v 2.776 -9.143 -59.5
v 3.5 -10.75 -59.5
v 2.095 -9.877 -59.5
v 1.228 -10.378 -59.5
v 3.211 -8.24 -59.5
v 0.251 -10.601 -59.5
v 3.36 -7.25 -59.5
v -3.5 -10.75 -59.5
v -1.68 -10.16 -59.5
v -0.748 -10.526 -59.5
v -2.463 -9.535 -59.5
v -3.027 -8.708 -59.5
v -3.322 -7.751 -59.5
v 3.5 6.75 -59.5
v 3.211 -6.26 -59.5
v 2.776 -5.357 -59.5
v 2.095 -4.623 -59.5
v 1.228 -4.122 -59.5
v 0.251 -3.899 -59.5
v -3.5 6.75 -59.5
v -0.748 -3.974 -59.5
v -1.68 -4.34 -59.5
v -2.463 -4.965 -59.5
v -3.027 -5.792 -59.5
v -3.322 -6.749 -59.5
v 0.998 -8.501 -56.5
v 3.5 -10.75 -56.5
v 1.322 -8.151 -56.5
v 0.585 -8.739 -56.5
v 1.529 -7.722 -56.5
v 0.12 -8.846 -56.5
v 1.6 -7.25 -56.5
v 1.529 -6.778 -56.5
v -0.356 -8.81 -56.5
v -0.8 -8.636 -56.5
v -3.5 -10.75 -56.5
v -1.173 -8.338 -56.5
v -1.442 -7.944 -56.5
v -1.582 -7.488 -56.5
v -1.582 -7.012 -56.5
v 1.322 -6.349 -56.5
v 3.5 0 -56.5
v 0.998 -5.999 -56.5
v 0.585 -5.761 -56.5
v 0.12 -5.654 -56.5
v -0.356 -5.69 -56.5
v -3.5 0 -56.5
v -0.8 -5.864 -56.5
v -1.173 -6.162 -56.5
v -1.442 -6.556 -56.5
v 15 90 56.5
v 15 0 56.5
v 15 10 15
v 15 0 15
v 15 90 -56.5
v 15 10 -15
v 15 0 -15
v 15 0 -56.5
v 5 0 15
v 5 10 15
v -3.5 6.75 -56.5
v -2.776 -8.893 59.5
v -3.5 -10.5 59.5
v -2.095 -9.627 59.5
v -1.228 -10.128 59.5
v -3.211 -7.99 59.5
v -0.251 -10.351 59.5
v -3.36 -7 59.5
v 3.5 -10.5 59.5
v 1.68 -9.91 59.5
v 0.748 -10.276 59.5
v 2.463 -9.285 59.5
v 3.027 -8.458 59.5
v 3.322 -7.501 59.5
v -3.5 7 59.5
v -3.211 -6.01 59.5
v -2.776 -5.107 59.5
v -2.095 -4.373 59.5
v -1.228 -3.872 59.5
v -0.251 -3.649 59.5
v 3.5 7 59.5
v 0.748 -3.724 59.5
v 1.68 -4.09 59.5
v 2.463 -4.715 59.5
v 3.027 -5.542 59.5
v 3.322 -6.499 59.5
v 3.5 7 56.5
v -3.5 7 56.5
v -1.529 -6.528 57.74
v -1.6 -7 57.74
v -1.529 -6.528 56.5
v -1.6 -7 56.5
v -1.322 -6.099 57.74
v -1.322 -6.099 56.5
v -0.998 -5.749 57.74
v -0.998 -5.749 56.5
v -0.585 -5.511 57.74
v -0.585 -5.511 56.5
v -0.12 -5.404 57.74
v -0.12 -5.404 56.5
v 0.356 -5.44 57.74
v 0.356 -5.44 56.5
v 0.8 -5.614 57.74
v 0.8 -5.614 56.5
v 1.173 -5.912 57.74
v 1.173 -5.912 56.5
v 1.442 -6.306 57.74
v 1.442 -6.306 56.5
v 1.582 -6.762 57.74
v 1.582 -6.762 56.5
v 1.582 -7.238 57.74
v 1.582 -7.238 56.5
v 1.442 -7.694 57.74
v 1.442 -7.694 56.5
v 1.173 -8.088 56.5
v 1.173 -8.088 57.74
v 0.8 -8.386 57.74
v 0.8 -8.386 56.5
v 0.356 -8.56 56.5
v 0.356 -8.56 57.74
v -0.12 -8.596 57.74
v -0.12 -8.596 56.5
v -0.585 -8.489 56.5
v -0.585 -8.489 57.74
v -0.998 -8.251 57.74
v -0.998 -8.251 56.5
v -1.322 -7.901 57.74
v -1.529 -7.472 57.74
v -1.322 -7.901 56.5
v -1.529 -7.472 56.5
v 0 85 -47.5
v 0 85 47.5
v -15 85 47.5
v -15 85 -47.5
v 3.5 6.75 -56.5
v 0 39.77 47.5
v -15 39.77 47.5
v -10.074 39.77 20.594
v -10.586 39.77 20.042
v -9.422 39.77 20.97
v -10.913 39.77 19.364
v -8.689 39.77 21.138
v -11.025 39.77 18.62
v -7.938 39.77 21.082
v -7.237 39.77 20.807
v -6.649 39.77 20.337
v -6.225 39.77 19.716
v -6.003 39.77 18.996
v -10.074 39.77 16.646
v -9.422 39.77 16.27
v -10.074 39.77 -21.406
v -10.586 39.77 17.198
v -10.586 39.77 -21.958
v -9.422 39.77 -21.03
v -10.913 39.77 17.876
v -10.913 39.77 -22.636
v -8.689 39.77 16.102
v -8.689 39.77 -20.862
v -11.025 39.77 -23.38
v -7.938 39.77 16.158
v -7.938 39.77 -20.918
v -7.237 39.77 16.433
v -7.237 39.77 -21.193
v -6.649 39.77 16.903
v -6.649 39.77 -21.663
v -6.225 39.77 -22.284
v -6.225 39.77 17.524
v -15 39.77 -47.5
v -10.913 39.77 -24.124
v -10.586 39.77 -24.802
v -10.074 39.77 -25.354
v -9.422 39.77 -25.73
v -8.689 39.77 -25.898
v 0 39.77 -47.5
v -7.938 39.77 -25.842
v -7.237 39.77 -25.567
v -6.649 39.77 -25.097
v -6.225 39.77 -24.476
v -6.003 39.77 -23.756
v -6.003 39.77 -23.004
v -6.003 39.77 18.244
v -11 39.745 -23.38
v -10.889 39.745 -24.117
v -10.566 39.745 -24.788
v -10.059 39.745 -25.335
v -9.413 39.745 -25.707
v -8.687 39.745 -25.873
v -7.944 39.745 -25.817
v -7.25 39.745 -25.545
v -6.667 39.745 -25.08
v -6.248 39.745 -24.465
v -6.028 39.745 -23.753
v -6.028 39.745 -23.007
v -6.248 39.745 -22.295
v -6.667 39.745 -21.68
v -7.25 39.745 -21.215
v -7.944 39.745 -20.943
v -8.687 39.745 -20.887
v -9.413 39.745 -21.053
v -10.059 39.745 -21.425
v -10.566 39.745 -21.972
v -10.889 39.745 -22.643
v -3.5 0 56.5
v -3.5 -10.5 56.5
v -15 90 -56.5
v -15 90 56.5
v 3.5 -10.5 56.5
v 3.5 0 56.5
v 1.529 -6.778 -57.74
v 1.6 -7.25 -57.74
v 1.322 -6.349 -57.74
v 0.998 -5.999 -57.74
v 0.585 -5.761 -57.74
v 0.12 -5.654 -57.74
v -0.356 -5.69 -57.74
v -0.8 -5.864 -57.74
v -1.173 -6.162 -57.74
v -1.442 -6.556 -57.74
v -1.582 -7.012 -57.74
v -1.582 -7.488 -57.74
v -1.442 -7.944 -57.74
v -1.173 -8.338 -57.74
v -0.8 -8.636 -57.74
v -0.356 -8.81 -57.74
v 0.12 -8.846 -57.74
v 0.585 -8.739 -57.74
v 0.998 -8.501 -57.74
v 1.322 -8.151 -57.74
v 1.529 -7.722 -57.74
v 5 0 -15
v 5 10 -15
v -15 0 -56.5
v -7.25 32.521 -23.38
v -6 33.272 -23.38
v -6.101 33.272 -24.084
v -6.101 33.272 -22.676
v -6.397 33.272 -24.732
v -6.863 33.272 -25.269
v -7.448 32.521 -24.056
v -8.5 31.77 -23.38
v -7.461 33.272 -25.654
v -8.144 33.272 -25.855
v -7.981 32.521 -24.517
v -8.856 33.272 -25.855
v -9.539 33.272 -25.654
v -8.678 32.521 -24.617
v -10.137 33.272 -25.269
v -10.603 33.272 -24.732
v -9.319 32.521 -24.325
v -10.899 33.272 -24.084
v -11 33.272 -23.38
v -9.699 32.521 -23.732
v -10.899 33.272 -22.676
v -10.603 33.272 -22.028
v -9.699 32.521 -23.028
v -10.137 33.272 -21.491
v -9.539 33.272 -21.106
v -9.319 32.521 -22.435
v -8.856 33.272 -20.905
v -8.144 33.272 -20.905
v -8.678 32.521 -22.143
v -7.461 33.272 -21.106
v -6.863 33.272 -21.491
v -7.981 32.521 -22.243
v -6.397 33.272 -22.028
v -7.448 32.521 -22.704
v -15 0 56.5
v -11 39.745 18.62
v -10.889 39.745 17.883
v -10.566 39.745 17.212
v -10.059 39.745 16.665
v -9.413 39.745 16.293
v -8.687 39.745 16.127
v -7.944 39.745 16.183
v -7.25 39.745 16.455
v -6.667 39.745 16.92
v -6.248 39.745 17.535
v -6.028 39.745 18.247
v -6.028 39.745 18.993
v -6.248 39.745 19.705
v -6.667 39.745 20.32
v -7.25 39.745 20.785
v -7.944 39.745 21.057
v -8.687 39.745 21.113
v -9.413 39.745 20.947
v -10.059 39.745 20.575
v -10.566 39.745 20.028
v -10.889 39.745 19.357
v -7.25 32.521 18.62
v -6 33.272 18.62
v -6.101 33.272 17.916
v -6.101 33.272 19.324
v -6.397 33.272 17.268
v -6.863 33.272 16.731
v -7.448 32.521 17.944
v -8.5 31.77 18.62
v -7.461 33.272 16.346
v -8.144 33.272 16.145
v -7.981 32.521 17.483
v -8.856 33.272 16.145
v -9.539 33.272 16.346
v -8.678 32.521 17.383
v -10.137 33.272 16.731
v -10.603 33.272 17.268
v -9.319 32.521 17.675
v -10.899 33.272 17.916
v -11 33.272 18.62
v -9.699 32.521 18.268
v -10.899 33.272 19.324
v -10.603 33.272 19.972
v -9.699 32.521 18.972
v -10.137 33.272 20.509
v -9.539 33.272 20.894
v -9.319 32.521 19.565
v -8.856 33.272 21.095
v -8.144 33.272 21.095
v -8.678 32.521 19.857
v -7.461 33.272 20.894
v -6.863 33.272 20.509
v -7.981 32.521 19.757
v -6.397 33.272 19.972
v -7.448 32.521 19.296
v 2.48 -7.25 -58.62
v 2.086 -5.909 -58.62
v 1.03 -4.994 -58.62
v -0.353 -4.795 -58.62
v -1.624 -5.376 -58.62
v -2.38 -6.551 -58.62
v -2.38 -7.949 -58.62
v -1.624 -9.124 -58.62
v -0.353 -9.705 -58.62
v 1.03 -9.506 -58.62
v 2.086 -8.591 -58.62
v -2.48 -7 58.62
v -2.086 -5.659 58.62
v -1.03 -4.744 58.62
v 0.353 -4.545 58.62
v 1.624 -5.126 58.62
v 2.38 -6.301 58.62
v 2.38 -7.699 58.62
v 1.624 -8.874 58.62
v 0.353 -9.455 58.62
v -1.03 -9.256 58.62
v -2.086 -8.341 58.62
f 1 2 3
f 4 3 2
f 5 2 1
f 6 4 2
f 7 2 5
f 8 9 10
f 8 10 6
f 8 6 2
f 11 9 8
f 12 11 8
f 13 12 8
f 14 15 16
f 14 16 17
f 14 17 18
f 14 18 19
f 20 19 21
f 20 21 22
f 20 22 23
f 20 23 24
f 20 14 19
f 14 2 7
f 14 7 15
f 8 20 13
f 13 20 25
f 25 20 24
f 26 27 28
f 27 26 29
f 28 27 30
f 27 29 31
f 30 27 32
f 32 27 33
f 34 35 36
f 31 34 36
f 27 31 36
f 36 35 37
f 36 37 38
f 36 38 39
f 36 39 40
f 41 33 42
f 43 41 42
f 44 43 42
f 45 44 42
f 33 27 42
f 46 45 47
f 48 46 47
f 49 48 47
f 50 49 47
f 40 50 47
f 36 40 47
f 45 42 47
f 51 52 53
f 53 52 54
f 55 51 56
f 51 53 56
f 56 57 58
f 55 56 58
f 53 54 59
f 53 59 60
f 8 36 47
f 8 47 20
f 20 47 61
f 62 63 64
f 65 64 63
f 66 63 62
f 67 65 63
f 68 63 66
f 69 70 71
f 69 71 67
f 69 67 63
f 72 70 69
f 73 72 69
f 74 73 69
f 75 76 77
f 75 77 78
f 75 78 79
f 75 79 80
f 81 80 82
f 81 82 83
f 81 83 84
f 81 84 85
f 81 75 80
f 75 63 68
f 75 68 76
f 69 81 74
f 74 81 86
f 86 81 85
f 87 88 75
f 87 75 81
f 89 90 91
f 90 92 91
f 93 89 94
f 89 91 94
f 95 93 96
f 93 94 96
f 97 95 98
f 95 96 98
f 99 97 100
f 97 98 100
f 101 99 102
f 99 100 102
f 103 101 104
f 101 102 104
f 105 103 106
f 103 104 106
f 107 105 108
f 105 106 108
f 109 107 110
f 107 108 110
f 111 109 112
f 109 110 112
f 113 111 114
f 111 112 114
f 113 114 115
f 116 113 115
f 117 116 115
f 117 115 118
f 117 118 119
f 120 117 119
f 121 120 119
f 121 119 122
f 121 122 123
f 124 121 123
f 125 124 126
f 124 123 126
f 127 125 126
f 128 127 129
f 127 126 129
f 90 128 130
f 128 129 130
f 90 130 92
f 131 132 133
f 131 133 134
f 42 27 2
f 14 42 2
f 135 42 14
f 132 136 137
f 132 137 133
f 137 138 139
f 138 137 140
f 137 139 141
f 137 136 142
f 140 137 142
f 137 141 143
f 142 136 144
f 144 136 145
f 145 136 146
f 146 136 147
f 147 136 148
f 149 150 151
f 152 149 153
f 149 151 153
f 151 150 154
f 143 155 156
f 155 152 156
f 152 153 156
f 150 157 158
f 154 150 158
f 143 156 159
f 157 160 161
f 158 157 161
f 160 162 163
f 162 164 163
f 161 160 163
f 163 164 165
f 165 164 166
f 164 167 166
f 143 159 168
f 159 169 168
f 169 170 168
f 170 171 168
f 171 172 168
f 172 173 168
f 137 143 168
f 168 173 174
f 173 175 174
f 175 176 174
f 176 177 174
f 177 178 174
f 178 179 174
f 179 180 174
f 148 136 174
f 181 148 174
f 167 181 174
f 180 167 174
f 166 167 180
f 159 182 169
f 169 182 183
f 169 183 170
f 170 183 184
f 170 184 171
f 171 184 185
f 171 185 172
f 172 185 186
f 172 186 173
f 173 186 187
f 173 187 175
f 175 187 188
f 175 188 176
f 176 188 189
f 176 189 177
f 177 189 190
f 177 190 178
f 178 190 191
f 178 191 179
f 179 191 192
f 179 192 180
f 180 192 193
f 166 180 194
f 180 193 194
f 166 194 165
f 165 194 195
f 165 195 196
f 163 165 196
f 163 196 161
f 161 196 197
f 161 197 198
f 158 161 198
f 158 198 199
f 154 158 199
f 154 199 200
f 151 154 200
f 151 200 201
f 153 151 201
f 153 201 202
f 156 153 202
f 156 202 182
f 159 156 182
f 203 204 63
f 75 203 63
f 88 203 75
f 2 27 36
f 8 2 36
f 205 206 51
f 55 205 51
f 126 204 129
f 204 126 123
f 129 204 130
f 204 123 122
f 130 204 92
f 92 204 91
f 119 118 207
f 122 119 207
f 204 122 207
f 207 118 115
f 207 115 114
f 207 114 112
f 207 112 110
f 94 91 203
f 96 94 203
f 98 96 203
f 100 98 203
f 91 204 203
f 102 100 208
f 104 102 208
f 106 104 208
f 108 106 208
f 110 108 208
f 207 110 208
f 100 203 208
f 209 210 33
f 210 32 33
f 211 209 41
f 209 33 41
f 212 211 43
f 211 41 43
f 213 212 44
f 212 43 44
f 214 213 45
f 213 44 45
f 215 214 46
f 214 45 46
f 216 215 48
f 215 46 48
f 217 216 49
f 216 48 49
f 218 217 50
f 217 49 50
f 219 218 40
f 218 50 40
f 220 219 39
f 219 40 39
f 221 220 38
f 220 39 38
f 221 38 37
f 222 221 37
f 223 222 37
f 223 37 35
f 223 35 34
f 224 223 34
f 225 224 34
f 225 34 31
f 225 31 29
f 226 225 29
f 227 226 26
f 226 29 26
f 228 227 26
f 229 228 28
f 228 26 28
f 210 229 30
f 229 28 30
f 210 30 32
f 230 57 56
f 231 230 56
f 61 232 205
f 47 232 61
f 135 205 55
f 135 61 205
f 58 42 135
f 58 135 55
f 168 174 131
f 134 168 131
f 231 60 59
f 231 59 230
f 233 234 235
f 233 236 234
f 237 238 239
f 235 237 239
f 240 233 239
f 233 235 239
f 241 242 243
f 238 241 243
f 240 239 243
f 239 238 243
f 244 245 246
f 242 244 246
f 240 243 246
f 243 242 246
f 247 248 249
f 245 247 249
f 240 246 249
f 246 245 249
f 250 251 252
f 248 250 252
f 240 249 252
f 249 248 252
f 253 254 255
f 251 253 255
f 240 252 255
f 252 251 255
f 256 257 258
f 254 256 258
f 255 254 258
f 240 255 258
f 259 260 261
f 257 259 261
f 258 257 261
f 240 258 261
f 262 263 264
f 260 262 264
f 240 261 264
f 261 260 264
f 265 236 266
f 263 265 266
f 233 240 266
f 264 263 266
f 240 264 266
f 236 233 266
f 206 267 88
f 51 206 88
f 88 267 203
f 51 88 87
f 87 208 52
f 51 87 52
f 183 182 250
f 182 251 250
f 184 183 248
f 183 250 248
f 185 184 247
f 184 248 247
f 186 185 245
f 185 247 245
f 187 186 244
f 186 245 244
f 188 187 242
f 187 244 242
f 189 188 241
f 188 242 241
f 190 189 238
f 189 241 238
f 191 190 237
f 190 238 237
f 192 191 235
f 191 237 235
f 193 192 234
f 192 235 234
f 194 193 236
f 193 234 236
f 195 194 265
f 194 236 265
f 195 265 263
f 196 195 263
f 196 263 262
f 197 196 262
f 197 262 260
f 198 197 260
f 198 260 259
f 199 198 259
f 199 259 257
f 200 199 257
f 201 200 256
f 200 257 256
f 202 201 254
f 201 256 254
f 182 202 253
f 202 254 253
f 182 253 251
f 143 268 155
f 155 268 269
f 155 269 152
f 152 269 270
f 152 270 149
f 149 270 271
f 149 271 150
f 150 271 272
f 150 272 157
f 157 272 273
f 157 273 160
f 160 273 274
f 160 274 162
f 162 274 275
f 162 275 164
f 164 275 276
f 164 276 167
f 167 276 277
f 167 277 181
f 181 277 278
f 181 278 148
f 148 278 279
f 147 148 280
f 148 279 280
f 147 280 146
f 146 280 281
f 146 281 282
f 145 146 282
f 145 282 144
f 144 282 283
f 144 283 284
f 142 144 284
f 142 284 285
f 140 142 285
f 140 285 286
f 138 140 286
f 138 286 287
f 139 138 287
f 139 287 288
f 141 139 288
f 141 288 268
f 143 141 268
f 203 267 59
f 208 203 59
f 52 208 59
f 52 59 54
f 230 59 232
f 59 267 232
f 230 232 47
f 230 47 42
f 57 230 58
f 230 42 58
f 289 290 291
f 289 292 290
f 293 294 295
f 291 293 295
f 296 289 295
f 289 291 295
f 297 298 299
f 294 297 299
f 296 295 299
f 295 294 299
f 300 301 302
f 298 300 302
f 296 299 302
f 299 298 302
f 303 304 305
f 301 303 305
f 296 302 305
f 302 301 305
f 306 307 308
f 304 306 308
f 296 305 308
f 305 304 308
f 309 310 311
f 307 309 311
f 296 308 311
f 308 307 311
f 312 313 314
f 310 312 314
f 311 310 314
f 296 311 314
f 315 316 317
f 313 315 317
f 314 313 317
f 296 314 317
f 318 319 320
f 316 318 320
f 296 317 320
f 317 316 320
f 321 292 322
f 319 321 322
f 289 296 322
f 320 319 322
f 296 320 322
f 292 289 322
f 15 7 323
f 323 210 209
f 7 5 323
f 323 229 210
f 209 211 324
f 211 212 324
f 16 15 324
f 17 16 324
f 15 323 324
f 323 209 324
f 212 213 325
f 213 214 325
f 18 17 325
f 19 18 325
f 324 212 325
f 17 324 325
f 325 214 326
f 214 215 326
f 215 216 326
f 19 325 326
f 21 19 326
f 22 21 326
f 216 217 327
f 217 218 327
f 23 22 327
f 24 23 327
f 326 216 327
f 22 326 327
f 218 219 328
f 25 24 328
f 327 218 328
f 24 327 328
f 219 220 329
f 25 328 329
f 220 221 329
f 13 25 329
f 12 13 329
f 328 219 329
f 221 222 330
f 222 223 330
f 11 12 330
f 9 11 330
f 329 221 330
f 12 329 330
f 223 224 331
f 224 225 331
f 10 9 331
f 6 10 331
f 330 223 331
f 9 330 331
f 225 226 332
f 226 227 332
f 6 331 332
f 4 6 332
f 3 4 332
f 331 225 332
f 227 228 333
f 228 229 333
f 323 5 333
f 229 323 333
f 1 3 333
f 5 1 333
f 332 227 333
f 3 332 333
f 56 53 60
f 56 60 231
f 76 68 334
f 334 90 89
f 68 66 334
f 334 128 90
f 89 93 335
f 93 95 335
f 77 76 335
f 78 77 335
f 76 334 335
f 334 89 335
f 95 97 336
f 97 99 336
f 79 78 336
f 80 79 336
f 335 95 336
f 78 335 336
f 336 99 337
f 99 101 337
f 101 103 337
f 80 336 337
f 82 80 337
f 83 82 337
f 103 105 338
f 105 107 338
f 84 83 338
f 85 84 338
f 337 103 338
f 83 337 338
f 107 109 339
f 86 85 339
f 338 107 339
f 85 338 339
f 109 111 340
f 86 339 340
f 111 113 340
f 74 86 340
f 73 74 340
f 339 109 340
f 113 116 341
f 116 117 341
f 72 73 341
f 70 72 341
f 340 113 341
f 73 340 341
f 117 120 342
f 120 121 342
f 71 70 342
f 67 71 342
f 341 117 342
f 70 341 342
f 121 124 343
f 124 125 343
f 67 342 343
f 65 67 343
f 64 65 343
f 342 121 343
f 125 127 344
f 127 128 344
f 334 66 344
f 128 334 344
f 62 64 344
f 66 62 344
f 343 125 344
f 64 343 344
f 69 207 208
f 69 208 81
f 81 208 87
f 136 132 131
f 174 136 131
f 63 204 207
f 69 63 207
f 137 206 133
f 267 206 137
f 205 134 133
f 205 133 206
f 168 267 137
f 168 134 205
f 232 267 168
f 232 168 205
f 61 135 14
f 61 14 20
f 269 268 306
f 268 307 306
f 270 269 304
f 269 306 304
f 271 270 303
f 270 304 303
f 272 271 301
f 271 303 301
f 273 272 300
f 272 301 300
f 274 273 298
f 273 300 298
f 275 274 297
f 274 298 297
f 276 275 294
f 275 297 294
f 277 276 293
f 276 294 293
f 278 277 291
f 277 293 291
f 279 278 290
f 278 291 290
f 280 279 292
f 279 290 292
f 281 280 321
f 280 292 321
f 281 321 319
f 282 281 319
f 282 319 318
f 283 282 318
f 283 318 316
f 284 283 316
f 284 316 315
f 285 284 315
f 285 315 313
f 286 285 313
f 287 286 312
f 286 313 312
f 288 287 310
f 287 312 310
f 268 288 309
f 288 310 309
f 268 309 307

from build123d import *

# Parameters (mm, degrees)
SKETCH1_W                                            = 30
SKETCH1_H                                            = 113
BOSS_EXTRUDE1_DEPTH                                  = 90
SKETCH3_W                                            = 95
SKETCH3_H                                            = 45.23
CUT_EXTRUDE1_DEPTH                                   = 90
SKETCH4_W                                            = 30
SKETCH4_H                                            = 10
CUT_EXTRUDE2_DEPTH                                   = 10
F_5_0_5_DIAMETER_HOLE1_D                             = 5
F_5_0_5_DIAMETER_HOLE1_DEPTH                         = 6.497848452
F_5_0_5_DIAMETER_HOLE1_CSINK_D                       = 5.05
F_5_0_5_DIAMETER_HOLE1_CSINK_ANGLE                   = 90
F_5_0_5_DIAMETER_HOLE1_TIP                           = 1.502151548
SKETCH9_W                                            = 7
SKETCH9_H                                            = 17.5
BOSS_EXTRUDE2_DEPTH                                  = 3
CSK_FOR_M3_HEX_SOCKET_COUNTERSUNK_CAP_SC_D           = 3.2
CSK_FOR_M3_HEX_SOCKET_COUNTERSUNK_CAP_SC_DEPTH       = 7.23862301
CSK_FOR_M3_HEX_SOCKET_COUNTERSUNK_CAP_SC_CSINK_D     = 6.72
CSK_FOR_M3_HEX_SOCKET_COUNTERSUNK_CAP_SC_CSINK_ANGLE = 90
CSK_FOR_M3_HEX_SOCKET_COUNTERSUNK_CAP_SC_TIP         = 0.96137699
SKETCH14_W                                           = 7
SKETCH14_H                                           = 17.5
BOSS_EXTRUDE3_DEPTH                                  = 3
CSK_FOR_M3_HEX_SOCKET_COUNTERSUNK_CA_2_D             = 3.2
CSK_FOR_M3_HEX_SOCKET_COUNTERSUNK_CA_2_DEPTH         = 7.23862301
CSK_FOR_M3_HEX_SOCKET_COUNTERSUNK_CA_2_CSINK_D       = 6.72
CSK_FOR_M3_HEX_SOCKET_COUNTERSUNK_CA_2_CSINK_ANGLE   = 90
CSK_FOR_M3_HEX_SOCKET_COUNTERSUNK_CA_2_TIP           = 0.96137699


with BuildPart() as part:
    # Sketch1 → Boss-Extrude1 (new body)
    with BuildSketch(Plane(origin=(0, 0, 0), x_dir=(1, 0, 0), z_dir=(0, 1, 0))):
        Rectangle(SKETCH1_W, SKETCH1_H)
    extrude(amount=BOSS_EXTRUDE1_DEPTH)

    # Sketch3 → Cut-Extrude1 (cut)
    with BuildSketch(Plane(origin=(0, 0, 0), x_dir=(0, 0, -1), z_dir=(1, 0, 0))):
        with Locations((0, 62.385)):
            Rectangle(SKETCH3_W, SKETCH3_H)
    extrude(amount=-CUT_EXTRUDE1_DEPTH, mode=Mode.SUBTRACT)

    # Sketch4 → Cut-Extrude2 (cut)
    with BuildSketch(Plane(origin=(15, 0, 0), x_dir=(0, 0, -1), z_dir=(1, 0, 0))):
        with Locations((0, 5)):
            Rectangle(SKETCH4_W, SKETCH4_H)
    extrude(amount=-CUT_EXTRUDE2_DEPTH, mode=Mode.SUBTRACT)

    # Ø5.0 (5) Diameter Hole1
    with Locations(Plane(origin=(0, 39.77, 0), x_dir=(1, 0, 0), z_dir=(0, 1, 0))):
        with Locations((-8.5, 23.38), (-8.5, -18.62)):
            CounterSinkHole(F_5_0_5_DIAMETER_HOLE1_D / 2, F_5_0_5_DIAMETER_HOLE1_CSINK_D / 2, depth=F_5_0_5_DIAMETER_HOLE1_DEPTH, counter_sink_angle=F_5_0_5_DIAMETER_HOLE1_CSINK_ANGLE)
            with Locations((0, 0, -(F_5_0_5_DIAMETER_HOLE1_DEPTH + F_5_0_5_DIAMETER_HOLE1_TIP / 2))):  # 118° drill point
                Cone(0, F_5_0_5_DIAMETER_HOLE1_D / 2, F_5_0_5_DIAMETER_HOLE1_TIP, mode=Mode.SUBTRACT)

    # Sketch9 → Boss-Extrude2 (add)
    with BuildSketch(Plane(origin=(0, 0, -56.5), x_dir=(-1, 0, 0), z_dir=(0, 0, -1))):
        with Locations((0, -2)):
            Rectangle(SKETCH9_W, SKETCH9_H)
    extrude(amount=BOSS_EXTRUDE2_DEPTH)

    # CSK for M3 Hex Socket Countersunk Cap Sc
    with Locations(Plane(origin=(0, 0, -59.5), x_dir=(-1, 0, 0), z_dir=(0, 0, -1))):
        with Locations((0, -7.25)):
            CounterSinkHole(CSK_FOR_M3_HEX_SOCKET_COUNTERSUNK_CAP_SC_D / 2, CSK_FOR_M3_HEX_SOCKET_COUNTERSUNK_CAP_SC_CSINK_D / 2, depth=CSK_FOR_M3_HEX_SOCKET_COUNTERSUNK_CAP_SC_DEPTH, counter_sink_angle=CSK_FOR_M3_HEX_SOCKET_COUNTERSUNK_CAP_SC_CSINK_ANGLE)
            with Locations((0, 0, -(CSK_FOR_M3_HEX_SOCKET_COUNTERSUNK_CAP_SC_DEPTH + CSK_FOR_M3_HEX_SOCKET_COUNTERSUNK_CAP_SC_TIP / 2))):  # 118° drill point
                Cone(0, CSK_FOR_M3_HEX_SOCKET_COUNTERSUNK_CAP_SC_D / 2, CSK_FOR_M3_HEX_SOCKET_COUNTERSUNK_CAP_SC_TIP, mode=Mode.SUBTRACT)

    # Sketch14 → Boss-Extrude3 (add)
    with BuildSketch(Plane.XY.offset(56.5)):
        with Locations((0, -1.75)):
            Rectangle(SKETCH14_W, SKETCH14_H)
    extrude(amount=BOSS_EXTRUDE3_DEPTH)

    # CSK for M3 Hex Socket Countersunk Ca 2
    with Locations(Plane.XY.offset(59.5)):
        with Locations((0, -7)):
            CounterSinkHole(CSK_FOR_M3_HEX_SOCKET_COUNTERSUNK_CA_2_D / 2, CSK_FOR_M3_HEX_SOCKET_COUNTERSUNK_CA_2_CSINK_D / 2, depth=CSK_FOR_M3_HEX_SOCKET_COUNTERSUNK_CA_2_DEPTH, counter_sink_angle=CSK_FOR_M3_HEX_SOCKET_COUNTERSUNK_CA_2_CSINK_ANGLE)
            with Locations((0, 0, -(CSK_FOR_M3_HEX_SOCKET_COUNTERSUNK_CA_2_DEPTH + CSK_FOR_M3_HEX_SOCKET_COUNTERSUNK_CA_2_TIP / 2))):  # 118° drill point
                Cone(0, CSK_FOR_M3_HEX_SOCKET_COUNTERSUNK_CA_2_D / 2, CSK_FOR_M3_HEX_SOCKET_COUNTERSUNK_CA_2_TIP, mode=Mode.SUBTRACT)


solid = part.part
